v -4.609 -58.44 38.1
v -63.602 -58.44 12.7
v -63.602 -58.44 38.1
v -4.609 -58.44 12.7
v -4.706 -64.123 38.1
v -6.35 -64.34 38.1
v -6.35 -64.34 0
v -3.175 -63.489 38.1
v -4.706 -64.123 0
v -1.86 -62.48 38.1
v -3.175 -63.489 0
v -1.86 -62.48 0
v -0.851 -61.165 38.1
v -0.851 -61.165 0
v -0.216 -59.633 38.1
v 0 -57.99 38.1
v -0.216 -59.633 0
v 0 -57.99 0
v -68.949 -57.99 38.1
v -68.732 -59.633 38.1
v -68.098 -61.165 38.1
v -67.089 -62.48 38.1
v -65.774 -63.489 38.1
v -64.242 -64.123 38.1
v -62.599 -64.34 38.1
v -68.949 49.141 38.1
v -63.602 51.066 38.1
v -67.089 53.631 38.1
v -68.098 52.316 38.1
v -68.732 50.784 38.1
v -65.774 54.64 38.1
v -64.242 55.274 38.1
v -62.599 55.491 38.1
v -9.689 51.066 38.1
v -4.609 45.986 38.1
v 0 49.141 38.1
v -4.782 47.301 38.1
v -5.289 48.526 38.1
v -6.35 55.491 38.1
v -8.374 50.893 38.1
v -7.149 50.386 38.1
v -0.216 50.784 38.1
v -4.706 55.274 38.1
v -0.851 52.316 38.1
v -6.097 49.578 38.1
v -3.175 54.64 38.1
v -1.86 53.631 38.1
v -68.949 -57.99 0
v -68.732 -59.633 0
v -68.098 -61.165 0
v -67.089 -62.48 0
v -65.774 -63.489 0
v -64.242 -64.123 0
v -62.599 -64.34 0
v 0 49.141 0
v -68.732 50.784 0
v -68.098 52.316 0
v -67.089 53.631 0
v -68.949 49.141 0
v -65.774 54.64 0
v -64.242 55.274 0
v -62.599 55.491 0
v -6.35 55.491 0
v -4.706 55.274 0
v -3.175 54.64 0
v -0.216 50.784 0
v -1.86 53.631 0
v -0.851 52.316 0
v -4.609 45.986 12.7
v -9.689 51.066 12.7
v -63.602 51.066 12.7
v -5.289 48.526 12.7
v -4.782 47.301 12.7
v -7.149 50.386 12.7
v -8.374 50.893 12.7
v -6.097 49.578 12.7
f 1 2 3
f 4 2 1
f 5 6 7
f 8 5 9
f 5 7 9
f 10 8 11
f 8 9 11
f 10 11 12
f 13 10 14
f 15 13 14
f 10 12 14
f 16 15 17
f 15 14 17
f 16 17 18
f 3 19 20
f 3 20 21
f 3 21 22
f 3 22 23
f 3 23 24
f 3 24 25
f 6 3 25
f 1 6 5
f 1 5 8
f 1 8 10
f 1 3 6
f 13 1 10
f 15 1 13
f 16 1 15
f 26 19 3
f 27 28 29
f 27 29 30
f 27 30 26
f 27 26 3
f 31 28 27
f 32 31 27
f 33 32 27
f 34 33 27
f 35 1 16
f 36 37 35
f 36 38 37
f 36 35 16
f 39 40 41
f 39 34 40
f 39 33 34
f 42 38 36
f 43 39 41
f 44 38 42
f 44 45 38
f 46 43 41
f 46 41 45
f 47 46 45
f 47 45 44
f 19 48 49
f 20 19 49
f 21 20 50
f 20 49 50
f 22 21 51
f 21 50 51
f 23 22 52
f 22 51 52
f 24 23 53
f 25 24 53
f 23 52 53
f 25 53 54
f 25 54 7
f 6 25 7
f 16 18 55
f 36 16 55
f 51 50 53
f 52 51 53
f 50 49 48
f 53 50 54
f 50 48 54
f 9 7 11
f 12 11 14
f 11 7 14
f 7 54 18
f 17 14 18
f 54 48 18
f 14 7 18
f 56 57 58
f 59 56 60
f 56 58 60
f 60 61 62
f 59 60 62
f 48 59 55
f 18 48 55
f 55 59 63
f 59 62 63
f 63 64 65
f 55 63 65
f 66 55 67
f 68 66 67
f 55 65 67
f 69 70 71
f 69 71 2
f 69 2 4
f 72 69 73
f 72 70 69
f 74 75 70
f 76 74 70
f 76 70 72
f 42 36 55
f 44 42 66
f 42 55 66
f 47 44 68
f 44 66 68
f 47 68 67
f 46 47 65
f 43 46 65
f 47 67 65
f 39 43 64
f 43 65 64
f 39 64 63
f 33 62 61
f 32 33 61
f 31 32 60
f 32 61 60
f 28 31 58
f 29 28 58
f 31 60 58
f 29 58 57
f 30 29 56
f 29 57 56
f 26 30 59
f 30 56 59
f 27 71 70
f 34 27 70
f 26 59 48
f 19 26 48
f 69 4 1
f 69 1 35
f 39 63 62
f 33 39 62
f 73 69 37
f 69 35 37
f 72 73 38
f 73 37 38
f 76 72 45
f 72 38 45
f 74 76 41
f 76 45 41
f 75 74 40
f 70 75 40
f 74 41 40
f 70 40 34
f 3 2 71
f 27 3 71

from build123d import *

# Parameters (mm, degrees)
F0_W     = 58.993546
F0_H     = 109.506775
F1_DEPTH = 38.1
F2_DEPTH = 12.7
F3_R     = 5.08


with BuildPart() as f1:
    # F0 (on Top) → F1 (new body)
    with BuildSketch(Plane.XY):
        with BuildLine():
            Line((-62.598708, -64.339839), (-6.35, -64.339839))
            ThreePointArc((-6.35, -64.339839), (-1.859872, -62.479967), (0, -57.989839))
            Line((0, -57.989839), (0, 49.140807))
            ThreePointArc((0, 49.140807), (-1.859872, 53.630935), (-6.35, 55.490807))
            Line((-6.35, 55.490807), (-62.598708, 55.490807))
            ThreePointArc((-62.598708, 55.490807), (-67.088837, 53.630935), (-68.948708, 49.140807))
            Line((-68.948708, 49.140807), (-68.948708, -57.989839))
            ThreePointArc((-68.948708, -57.989839), (-67.088837, -62.479967), (-62.598708, -64.339839))
        make_face()
        with Locations((-34.105645, -3.687096)):
            Rectangle(F0_W, F0_H, mode=Mode.SUBTRACT)
    extrude(amount=F1_DEPTH)

    # F0 (on Top) → F2 (join)
    with BuildSketch(Plane.XY):
        with Locations((-34.105645, -3.687096)):
            Rectangle(F0_W, F0_H)
    extrude(amount=F2_DEPTH)

    # F3
    f3_edges = [f1.edges().sort_by_distance(p)[0] for p in [
        (-4.608872, 51.066291, 25.4),
    ]]
    fillet(f3_edges, radius=F3_R)


solid = f1.part
